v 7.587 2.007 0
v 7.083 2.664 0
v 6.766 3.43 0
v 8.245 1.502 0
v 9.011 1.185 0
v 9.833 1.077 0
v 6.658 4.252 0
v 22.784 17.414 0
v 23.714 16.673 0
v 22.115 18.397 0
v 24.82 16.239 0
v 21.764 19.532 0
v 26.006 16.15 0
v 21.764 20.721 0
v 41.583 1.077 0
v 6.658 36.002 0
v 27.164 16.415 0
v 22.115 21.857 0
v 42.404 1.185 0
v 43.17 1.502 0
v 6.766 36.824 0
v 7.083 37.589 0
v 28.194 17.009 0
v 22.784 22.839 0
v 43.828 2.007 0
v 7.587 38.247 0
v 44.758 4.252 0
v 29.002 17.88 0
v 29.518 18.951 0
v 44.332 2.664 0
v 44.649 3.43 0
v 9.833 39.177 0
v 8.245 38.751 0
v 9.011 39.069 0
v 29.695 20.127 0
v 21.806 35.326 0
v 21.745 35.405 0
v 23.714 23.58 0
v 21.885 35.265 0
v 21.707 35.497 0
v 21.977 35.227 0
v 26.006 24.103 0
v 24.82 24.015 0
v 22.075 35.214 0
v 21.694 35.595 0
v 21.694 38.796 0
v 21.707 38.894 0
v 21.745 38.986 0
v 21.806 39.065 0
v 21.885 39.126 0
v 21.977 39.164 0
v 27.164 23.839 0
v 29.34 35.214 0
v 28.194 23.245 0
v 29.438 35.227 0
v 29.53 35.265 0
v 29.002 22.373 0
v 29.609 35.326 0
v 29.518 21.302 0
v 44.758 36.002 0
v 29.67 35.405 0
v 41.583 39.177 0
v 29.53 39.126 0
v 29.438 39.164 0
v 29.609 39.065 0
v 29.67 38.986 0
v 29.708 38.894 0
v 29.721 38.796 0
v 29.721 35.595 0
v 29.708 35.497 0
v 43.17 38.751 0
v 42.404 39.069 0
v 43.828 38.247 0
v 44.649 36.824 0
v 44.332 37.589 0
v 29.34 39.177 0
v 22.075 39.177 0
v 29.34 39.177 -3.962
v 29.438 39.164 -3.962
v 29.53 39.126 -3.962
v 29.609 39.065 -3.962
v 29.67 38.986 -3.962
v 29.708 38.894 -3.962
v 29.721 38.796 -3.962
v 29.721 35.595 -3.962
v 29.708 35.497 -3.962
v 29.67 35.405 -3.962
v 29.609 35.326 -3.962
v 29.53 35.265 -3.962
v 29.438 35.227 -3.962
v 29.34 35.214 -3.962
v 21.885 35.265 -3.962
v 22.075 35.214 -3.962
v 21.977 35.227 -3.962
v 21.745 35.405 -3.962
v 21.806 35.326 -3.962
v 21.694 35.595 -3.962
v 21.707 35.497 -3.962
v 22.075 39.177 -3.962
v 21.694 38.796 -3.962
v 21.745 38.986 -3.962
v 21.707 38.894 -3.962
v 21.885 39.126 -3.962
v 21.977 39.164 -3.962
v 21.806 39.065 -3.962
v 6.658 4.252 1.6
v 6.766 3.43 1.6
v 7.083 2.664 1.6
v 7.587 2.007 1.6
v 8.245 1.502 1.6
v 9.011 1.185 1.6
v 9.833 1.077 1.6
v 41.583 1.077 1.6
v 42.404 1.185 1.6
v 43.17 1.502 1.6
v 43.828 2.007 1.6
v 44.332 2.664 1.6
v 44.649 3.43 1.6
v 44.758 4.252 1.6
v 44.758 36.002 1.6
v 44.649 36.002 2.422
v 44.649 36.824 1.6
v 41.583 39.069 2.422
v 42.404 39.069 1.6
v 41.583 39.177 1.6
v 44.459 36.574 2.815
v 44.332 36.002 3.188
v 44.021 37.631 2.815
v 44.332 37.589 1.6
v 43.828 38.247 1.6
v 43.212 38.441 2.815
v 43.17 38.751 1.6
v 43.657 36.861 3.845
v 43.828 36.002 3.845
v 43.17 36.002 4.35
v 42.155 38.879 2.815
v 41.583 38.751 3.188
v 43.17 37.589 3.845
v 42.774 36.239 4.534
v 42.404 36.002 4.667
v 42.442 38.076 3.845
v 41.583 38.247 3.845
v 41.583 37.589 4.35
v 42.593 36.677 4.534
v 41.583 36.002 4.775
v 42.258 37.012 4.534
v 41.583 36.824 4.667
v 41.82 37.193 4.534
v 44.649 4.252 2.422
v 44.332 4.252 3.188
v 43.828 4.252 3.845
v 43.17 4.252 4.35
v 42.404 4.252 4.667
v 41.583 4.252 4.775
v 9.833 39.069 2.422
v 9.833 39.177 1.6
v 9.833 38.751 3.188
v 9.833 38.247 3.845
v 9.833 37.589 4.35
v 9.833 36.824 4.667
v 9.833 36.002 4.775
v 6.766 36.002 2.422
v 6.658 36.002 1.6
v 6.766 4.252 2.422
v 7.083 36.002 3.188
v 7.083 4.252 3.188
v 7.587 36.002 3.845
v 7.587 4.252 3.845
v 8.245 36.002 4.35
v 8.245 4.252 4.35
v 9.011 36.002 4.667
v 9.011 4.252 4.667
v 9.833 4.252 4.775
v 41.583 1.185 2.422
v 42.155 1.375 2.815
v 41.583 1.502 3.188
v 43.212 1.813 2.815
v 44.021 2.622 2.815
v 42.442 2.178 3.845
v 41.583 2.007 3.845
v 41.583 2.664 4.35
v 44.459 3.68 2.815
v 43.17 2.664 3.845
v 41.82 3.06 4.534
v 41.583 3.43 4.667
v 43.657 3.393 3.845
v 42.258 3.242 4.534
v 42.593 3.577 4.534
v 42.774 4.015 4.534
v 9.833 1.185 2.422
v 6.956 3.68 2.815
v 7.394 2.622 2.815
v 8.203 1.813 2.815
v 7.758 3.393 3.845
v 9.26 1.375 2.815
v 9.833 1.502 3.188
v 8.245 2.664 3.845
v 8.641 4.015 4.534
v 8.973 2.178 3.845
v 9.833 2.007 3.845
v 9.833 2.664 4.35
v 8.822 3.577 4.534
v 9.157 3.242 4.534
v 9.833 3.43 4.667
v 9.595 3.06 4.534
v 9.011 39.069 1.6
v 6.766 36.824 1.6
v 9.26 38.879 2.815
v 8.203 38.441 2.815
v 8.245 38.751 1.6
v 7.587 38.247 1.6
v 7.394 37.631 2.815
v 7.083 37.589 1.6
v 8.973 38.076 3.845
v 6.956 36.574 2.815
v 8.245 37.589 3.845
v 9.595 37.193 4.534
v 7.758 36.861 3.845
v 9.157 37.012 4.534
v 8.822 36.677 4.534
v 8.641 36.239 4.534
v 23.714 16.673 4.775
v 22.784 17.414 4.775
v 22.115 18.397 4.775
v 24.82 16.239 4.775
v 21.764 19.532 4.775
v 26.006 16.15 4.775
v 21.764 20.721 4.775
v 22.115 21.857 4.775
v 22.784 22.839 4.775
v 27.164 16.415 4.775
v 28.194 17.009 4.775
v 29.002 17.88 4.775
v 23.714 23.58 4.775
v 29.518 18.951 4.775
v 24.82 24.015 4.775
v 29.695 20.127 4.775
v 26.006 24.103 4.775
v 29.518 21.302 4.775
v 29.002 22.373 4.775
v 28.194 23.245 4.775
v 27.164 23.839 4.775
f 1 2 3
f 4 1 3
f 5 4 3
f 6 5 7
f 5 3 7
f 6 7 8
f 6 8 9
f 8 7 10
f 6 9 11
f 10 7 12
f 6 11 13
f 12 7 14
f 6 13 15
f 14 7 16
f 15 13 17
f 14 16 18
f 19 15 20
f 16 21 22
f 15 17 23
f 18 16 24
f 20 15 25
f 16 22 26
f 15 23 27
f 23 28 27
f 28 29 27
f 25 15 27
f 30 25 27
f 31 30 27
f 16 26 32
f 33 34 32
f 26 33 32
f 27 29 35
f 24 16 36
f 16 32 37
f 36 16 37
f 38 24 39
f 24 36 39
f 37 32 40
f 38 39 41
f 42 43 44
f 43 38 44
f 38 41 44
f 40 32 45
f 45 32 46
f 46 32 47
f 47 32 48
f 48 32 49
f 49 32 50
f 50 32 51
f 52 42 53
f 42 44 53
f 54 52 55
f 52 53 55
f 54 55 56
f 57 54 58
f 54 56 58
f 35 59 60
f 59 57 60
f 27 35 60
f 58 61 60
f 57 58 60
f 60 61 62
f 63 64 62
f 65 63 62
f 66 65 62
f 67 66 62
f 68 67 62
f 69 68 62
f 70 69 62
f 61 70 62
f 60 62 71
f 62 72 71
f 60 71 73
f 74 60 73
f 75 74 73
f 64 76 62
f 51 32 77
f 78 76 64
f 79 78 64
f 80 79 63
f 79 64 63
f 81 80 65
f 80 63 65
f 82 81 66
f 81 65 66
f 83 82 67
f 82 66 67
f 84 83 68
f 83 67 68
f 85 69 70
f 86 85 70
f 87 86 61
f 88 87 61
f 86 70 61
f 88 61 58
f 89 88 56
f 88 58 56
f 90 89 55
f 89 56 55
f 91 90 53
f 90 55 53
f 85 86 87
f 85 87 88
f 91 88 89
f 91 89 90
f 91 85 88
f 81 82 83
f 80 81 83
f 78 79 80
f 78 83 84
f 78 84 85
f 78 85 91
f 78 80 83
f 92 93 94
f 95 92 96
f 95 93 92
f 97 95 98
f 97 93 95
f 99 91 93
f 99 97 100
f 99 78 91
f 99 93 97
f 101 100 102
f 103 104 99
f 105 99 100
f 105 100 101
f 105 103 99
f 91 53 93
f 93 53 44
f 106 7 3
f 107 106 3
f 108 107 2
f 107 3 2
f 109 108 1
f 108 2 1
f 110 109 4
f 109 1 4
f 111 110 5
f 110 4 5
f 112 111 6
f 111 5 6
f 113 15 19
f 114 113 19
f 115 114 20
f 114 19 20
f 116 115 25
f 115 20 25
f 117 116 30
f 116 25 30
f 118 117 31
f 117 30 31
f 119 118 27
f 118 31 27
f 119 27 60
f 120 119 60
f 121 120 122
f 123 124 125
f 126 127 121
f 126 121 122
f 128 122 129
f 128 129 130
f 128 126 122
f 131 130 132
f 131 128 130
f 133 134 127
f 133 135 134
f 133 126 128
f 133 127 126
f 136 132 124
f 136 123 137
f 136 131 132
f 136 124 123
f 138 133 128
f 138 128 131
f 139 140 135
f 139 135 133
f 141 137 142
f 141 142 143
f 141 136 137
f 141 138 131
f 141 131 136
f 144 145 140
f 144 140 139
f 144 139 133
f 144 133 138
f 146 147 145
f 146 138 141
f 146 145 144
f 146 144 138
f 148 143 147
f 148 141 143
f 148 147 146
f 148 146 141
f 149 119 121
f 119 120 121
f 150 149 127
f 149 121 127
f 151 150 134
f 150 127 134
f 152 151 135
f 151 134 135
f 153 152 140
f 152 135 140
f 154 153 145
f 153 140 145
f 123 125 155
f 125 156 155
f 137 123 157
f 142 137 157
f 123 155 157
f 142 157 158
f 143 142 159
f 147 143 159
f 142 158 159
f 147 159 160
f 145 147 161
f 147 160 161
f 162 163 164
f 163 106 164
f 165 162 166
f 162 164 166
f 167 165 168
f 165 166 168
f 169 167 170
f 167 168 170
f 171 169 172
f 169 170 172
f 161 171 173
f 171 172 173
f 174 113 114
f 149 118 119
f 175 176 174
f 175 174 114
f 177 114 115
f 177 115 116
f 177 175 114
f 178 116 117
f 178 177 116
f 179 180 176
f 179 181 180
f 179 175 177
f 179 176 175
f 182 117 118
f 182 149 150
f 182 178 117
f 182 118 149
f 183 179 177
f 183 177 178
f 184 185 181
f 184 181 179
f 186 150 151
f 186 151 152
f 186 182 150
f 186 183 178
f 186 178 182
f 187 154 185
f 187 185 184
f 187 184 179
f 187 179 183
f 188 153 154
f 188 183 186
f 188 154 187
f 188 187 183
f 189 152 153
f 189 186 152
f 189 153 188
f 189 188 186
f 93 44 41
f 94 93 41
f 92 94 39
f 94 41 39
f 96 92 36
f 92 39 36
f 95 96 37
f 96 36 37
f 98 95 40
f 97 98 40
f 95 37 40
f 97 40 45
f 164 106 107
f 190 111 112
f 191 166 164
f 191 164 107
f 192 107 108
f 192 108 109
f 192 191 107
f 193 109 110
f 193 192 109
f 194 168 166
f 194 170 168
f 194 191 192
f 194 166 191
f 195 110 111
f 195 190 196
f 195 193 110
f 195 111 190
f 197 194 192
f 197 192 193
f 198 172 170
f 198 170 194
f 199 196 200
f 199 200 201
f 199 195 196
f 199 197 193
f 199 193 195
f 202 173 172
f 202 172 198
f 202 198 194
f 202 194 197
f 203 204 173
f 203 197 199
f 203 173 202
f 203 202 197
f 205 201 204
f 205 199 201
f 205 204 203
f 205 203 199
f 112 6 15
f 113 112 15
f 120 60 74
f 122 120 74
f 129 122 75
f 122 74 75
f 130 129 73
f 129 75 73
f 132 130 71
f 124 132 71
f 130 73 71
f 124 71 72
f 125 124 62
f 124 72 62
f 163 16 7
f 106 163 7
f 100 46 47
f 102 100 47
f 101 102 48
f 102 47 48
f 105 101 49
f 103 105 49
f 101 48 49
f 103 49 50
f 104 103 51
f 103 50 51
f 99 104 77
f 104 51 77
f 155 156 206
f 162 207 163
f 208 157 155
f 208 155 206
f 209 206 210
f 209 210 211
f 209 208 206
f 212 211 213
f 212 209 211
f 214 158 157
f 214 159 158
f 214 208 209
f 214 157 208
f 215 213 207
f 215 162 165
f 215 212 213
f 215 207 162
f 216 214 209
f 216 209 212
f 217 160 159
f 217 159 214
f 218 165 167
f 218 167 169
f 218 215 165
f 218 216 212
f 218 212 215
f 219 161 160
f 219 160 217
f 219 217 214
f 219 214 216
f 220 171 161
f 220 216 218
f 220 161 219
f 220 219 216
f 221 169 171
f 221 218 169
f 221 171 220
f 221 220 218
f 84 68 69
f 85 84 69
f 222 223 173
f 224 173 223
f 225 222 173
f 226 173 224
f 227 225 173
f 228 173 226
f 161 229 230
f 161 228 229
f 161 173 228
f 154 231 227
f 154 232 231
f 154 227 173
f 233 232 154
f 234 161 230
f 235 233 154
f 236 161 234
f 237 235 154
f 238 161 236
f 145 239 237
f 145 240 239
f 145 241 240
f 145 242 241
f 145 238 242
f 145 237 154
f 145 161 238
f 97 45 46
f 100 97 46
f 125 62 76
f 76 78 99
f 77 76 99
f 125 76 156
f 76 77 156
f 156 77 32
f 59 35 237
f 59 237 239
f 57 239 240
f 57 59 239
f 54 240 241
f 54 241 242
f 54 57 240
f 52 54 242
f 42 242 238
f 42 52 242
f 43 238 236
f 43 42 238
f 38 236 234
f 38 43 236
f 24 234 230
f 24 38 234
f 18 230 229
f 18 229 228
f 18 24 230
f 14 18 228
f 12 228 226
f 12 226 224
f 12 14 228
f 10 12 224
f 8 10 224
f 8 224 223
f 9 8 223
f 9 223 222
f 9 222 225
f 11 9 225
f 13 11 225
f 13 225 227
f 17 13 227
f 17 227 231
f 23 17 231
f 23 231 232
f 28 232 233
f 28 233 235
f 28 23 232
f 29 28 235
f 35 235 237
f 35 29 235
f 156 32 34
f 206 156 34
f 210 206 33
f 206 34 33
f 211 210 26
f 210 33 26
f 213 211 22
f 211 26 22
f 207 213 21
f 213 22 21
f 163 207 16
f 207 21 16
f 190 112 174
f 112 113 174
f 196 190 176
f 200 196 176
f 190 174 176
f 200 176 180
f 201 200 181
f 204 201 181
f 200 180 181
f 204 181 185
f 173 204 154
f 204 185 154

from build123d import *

# Parameters (mm, degrees)
SKETCH1_R      = 3.9878
EXTRUDE1_DEPTH = 4.7752
FILLET1_R      = 3.175
EXTRUDE2_DEPTH = 3.9624


with BuildPart() as part:
    # Sketch1 → Extrude1 (new body)
    with BuildSketch(Plane.XY):
        with BuildLine():
            Line((9.832512944, 1.076805598), (41.582512944, 1.076805598))
            ThreePointArc((41.582512944, 1.076805598), (43.827576974, 2.006741568), (44.757512944, 4.251805598))
            Line((44.757512944, 4.251805598), (44.757512944, 36.001805598))
            ThreePointArc((44.757512944, 36.001805598), (43.827576974, 38.246869628), (41.582512944, 39.176805598))
            Line((41.582512944, 39.176805598), (9.832512944, 39.176805598))
            ThreePointArc((9.832512944, 39.176805598), (7.587448914, 38.246869628), (6.657512944, 36.001805598))
            Line((6.657512944, 36.001805598), (6.657512944, 4.251805598))
            ThreePointArc((6.657512944, 4.251805598), (7.587448914, 2.006741568), (9.832512944, 1.076805598))
        make_face()
        with Locations((25.707512944, 20.126805598)):
            Circle(SKETCH1_R, mode=Mode.SUBTRACT)
    extrude(amount=EXTRUDE1_DEPTH)

    # Fillet1
    fillet1_edges = [part.edges().sort_by_distance(p)[0] for p in [
        (25.707512944, 1.076805598, 4.7752),
        (43.827576974, 2.006741568, 4.7752),
        (44.757512944, 20.126805598, 4.7752),
        (43.827576974, 38.246869628, 4.7752),
        (25.707512944, 39.176805598, 4.7752),
        (7.587448914, 38.246869628, 4.7752),
        (6.657512944, 20.126805598, 4.7752),
        (7.587448914, 2.006741568, 4.7752),
    ]]
    fillet(fillet1_edges, radius=FILLET1_R)

    # Sketch2 → Extrude2 (add)
    with BuildSketch(Plane(origin=(0, 0, 0), x_dir=(-1, 0, 0), z_dir=(0, 0, -1))):
        with BuildLine():
            Line((-29.339712944, 35.214405598), (-22.075312944, 35.214405598))
            ThreePointArc((-22.075312944, 35.214405598), (-21.80590526, 35.325997914), (-21.694312944, 35.595405598))
            Line((-21.694312944, 35.595405598), (-21.694312944, 38.795805598))
            ThreePointArc((-21.694312944, 38.795805598), (-21.80590526, 39.065213281), (-22.075312944, 39.176805598))
            Line((-22.075312944, 39.176805598), (-29.339712944, 39.176805598))
            ThreePointArc((-29.339712944, 39.176805598), (-29.609120627, 39.065213281), (-29.720712944, 38.795805598))
            Line((-29.720712944, 38.795805598), (-29.720712944, 35.595405598))
            ThreePointArc((-29.720712944, 35.595405598), (-29.609120627, 35.325997914), (-29.339712944, 35.214405598))
        make_face()
    extrude(amount=EXTRUDE2_DEPTH)


solid = part.part
